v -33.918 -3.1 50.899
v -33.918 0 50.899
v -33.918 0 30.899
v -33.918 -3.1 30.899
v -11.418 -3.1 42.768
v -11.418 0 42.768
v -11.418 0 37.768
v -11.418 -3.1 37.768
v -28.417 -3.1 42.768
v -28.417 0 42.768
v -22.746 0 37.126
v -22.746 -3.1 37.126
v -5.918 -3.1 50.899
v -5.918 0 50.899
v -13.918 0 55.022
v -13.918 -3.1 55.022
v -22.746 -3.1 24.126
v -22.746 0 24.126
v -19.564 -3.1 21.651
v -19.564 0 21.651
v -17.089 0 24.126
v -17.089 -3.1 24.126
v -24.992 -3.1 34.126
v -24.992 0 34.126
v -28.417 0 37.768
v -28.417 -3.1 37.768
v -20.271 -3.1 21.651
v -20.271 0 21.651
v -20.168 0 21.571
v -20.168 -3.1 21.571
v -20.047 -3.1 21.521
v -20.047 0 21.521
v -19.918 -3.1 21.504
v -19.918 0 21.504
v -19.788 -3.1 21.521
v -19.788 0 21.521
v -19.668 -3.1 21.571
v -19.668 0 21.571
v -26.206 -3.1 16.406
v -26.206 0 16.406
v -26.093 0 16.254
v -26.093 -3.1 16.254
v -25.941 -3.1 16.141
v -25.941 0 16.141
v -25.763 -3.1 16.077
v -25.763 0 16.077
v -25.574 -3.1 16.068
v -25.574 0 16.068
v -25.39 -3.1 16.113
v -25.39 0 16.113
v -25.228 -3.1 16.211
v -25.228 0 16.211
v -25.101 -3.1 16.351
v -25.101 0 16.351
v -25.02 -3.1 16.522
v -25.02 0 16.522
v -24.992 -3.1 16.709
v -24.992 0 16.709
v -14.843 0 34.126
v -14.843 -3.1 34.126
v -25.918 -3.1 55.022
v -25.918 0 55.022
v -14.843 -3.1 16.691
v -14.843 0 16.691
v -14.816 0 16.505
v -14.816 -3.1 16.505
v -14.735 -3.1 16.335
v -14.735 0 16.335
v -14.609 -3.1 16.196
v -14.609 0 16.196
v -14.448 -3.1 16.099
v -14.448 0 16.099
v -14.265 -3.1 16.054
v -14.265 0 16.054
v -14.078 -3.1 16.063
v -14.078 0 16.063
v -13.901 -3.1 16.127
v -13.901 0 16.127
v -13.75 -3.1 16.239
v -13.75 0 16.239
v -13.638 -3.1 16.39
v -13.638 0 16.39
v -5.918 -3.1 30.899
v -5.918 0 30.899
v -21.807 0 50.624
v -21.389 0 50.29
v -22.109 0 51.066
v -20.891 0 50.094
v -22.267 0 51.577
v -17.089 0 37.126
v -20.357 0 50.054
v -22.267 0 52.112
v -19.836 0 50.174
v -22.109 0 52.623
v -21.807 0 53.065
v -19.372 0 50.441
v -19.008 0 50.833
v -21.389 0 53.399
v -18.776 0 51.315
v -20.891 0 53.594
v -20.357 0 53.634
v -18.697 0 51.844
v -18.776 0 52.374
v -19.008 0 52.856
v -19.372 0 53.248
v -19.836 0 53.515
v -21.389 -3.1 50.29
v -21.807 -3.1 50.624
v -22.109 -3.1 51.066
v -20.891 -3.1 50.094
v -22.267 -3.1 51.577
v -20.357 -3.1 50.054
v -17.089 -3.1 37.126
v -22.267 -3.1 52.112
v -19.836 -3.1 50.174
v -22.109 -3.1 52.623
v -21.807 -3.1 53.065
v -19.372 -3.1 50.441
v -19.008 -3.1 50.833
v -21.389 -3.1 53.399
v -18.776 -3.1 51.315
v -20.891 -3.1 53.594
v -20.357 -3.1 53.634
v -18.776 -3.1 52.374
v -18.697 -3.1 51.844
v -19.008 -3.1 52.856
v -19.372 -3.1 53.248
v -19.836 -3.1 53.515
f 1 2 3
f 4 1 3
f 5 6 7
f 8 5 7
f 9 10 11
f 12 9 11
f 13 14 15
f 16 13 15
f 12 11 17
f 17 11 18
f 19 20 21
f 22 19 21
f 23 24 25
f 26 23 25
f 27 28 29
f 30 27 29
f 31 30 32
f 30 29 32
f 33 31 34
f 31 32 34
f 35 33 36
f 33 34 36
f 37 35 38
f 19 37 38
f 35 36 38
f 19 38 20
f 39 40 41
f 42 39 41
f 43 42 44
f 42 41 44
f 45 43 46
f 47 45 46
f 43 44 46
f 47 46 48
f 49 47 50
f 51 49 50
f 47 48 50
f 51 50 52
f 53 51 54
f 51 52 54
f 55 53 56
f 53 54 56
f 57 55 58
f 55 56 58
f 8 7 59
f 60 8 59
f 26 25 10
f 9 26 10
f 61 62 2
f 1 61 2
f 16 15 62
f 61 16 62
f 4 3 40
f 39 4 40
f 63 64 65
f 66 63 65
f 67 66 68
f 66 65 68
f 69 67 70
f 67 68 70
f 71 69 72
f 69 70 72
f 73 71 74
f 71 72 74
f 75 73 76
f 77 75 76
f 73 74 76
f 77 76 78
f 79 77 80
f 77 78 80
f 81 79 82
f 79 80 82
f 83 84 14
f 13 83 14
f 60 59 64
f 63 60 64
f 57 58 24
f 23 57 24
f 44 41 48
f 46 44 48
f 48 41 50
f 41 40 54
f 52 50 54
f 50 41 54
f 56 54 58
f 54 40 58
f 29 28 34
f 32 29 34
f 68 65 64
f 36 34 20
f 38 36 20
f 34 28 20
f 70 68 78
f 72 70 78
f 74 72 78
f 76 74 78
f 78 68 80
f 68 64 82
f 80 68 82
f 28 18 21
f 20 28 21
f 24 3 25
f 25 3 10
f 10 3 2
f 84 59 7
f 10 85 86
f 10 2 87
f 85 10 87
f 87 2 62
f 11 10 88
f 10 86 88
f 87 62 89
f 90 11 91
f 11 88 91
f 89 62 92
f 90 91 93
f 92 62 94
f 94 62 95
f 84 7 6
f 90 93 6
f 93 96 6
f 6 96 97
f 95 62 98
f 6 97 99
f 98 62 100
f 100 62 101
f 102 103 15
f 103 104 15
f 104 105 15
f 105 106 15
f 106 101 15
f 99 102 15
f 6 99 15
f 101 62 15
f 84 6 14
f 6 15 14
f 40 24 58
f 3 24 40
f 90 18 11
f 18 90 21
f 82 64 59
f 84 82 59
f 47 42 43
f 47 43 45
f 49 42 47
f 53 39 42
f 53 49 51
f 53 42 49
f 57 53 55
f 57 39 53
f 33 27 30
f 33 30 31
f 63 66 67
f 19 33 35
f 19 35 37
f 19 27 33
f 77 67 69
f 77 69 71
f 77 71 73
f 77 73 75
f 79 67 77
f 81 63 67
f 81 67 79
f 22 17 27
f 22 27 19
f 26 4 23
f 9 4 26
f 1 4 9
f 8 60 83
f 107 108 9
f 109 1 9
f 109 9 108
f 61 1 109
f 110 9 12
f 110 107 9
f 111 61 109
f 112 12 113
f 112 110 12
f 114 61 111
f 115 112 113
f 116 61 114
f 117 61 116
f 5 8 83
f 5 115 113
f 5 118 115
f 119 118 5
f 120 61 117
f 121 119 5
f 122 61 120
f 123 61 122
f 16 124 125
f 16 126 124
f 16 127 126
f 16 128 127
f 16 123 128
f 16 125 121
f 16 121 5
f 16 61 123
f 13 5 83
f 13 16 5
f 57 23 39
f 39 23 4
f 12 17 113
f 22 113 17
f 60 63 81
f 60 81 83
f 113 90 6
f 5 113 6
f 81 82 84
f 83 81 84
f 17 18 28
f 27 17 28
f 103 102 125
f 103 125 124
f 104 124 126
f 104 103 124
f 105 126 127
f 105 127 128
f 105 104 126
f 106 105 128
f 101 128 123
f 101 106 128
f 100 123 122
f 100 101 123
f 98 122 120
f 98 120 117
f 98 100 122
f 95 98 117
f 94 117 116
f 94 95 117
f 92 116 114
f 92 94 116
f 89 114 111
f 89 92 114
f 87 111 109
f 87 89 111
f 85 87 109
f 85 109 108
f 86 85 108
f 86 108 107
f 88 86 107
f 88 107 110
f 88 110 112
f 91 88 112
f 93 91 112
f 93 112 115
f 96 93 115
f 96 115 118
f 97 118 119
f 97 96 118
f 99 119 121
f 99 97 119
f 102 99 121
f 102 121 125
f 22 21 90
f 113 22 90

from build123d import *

# Parameters (mm, degrees)
F0_R     = 1.795
F1_DEPTH = 3.1


with BuildPart() as f1:
    # F0 (on Front) → F1 (new body)
    with BuildSketch(Plane.XZ):
        with BuildLine():
            Line((-25.917618, 55.021677), (-33.917618, 50.898571))
            Line((-33.917618, 50.898571), (-33.917618, 30.898571))
            Line((-33.917618, 30.898571), (-26.205678, 16.406338))
            ThreePointArc((-26.205678, 16.406338), (-25.480558, 16.083714), (-24.99199, 16.709162))
            Line((-24.99199, 16.709162), (-24.99199, 34.125582))
            Line((-24.99199, 34.125582), (-28.417245, 37.768057))
            Line((-28.417245, 37.768057), (-28.417245, 42.768057))
            Line((-28.417245, 42.768057), (-22.746045, 37.125585))
            Line((-22.746045, 37.125585), (-22.746045, 24.125582))
            Line((-22.746045, 24.125582), (-20.271171, 21.650708))
            ThreePointArc((-20.271171, 21.650708), (-19.917618, 21.504262), (-19.564064, 21.650708))
            Line((-19.564064, 21.650708), (-17.089191, 24.125582))
            Line((-17.089191, 24.125582), (-17.089191, 37.125585))
            Line((-17.089191, 37.125585), (-11.41799, 42.768057))
            Line((-11.41799, 42.768057), (-11.41799, 37.768057))
            Line((-11.41799, 37.768057), (-14.843246, 34.125582))
            Line((-14.843246, 34.125582), (-14.843246, 16.690635))
            ThreePointArc((-14.843246, 16.690635), (-14.358181, 16.069672), (-13.638261, 16.389983))
            Line((-13.638261, 16.389983), (-5.917618, 30.898571))
            Line((-5.917618, 30.898571), (-5.917618, 50.898571))
            Line((-5.917618, 50.898571), (-13.917618, 55.021677))
            Line((-13.917618, 55.021677), (-25.917618, 55.021677))
        make_face()
        with Locations((-20.491593, 51.844455)):
            Circle(F0_R, mode=Mode.SUBTRACT)
    extrude(amount=F1_DEPTH)


solid = f1.part
